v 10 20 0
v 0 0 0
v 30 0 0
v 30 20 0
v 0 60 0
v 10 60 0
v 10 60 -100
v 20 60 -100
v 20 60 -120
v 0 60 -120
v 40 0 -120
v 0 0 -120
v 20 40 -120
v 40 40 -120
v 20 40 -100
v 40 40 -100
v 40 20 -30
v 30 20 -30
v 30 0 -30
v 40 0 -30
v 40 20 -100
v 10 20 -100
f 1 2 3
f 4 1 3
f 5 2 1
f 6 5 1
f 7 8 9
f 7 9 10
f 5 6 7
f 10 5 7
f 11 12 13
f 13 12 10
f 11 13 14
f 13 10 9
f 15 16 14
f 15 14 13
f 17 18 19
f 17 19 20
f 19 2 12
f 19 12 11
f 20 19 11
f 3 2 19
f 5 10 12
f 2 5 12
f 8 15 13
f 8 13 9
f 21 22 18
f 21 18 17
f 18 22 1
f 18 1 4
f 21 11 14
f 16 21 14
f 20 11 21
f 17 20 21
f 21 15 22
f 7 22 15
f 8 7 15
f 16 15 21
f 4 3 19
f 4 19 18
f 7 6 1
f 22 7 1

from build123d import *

# Parameters (mm, degrees)
F0_W     = 10
F0_H     = 40
F0_H_2   = 20
F1_DEPTH = 120
F2_DEPTH = 30
F3_DEPTH = 100


with BuildPart() as f1:
    # F0 (on Top) → F1 (new body)
    with BuildSketch(Plane.XY):
        with Locations((5, 40)):
            Rectangle(F0_W, F0_H)
        Polygon((10, 20), (30, 20), (40, 20), (40, 40), (20, 40), (20, 60), (10, 60), align=None)
        with Locations((35, 10)):
            Rectangle(F0_W, F0_H_2)
        Polygon((0, 20), (0, 0), (30, 0), (30, 20), (10, 20), align=None)
    extrude(amount=-F1_DEPTH)

    # F0 (on Top) → F2 (cut)
    with BuildSketch(Plane.XY):
        with Locations((35, 10)):
            Rectangle(F0_W, F0_H_2)
        Polygon((10, 20), (30, 20), (40, 20), (40, 40), (20, 40), (20, 60), (10, 60), align=None)
    extrude(amount=-F2_DEPTH, mode=Mode.SUBTRACT)

    # F0 (on Top) → F3 (cut)
    with BuildSketch(Plane.XY):
        Polygon((10, 20), (30, 20), (40, 20), (40, 40), (20, 40), (20, 60), (10, 60), align=None)
    extrude(amount=-F3_DEPTH, mode=Mode.SUBTRACT)


solid = f1.part
